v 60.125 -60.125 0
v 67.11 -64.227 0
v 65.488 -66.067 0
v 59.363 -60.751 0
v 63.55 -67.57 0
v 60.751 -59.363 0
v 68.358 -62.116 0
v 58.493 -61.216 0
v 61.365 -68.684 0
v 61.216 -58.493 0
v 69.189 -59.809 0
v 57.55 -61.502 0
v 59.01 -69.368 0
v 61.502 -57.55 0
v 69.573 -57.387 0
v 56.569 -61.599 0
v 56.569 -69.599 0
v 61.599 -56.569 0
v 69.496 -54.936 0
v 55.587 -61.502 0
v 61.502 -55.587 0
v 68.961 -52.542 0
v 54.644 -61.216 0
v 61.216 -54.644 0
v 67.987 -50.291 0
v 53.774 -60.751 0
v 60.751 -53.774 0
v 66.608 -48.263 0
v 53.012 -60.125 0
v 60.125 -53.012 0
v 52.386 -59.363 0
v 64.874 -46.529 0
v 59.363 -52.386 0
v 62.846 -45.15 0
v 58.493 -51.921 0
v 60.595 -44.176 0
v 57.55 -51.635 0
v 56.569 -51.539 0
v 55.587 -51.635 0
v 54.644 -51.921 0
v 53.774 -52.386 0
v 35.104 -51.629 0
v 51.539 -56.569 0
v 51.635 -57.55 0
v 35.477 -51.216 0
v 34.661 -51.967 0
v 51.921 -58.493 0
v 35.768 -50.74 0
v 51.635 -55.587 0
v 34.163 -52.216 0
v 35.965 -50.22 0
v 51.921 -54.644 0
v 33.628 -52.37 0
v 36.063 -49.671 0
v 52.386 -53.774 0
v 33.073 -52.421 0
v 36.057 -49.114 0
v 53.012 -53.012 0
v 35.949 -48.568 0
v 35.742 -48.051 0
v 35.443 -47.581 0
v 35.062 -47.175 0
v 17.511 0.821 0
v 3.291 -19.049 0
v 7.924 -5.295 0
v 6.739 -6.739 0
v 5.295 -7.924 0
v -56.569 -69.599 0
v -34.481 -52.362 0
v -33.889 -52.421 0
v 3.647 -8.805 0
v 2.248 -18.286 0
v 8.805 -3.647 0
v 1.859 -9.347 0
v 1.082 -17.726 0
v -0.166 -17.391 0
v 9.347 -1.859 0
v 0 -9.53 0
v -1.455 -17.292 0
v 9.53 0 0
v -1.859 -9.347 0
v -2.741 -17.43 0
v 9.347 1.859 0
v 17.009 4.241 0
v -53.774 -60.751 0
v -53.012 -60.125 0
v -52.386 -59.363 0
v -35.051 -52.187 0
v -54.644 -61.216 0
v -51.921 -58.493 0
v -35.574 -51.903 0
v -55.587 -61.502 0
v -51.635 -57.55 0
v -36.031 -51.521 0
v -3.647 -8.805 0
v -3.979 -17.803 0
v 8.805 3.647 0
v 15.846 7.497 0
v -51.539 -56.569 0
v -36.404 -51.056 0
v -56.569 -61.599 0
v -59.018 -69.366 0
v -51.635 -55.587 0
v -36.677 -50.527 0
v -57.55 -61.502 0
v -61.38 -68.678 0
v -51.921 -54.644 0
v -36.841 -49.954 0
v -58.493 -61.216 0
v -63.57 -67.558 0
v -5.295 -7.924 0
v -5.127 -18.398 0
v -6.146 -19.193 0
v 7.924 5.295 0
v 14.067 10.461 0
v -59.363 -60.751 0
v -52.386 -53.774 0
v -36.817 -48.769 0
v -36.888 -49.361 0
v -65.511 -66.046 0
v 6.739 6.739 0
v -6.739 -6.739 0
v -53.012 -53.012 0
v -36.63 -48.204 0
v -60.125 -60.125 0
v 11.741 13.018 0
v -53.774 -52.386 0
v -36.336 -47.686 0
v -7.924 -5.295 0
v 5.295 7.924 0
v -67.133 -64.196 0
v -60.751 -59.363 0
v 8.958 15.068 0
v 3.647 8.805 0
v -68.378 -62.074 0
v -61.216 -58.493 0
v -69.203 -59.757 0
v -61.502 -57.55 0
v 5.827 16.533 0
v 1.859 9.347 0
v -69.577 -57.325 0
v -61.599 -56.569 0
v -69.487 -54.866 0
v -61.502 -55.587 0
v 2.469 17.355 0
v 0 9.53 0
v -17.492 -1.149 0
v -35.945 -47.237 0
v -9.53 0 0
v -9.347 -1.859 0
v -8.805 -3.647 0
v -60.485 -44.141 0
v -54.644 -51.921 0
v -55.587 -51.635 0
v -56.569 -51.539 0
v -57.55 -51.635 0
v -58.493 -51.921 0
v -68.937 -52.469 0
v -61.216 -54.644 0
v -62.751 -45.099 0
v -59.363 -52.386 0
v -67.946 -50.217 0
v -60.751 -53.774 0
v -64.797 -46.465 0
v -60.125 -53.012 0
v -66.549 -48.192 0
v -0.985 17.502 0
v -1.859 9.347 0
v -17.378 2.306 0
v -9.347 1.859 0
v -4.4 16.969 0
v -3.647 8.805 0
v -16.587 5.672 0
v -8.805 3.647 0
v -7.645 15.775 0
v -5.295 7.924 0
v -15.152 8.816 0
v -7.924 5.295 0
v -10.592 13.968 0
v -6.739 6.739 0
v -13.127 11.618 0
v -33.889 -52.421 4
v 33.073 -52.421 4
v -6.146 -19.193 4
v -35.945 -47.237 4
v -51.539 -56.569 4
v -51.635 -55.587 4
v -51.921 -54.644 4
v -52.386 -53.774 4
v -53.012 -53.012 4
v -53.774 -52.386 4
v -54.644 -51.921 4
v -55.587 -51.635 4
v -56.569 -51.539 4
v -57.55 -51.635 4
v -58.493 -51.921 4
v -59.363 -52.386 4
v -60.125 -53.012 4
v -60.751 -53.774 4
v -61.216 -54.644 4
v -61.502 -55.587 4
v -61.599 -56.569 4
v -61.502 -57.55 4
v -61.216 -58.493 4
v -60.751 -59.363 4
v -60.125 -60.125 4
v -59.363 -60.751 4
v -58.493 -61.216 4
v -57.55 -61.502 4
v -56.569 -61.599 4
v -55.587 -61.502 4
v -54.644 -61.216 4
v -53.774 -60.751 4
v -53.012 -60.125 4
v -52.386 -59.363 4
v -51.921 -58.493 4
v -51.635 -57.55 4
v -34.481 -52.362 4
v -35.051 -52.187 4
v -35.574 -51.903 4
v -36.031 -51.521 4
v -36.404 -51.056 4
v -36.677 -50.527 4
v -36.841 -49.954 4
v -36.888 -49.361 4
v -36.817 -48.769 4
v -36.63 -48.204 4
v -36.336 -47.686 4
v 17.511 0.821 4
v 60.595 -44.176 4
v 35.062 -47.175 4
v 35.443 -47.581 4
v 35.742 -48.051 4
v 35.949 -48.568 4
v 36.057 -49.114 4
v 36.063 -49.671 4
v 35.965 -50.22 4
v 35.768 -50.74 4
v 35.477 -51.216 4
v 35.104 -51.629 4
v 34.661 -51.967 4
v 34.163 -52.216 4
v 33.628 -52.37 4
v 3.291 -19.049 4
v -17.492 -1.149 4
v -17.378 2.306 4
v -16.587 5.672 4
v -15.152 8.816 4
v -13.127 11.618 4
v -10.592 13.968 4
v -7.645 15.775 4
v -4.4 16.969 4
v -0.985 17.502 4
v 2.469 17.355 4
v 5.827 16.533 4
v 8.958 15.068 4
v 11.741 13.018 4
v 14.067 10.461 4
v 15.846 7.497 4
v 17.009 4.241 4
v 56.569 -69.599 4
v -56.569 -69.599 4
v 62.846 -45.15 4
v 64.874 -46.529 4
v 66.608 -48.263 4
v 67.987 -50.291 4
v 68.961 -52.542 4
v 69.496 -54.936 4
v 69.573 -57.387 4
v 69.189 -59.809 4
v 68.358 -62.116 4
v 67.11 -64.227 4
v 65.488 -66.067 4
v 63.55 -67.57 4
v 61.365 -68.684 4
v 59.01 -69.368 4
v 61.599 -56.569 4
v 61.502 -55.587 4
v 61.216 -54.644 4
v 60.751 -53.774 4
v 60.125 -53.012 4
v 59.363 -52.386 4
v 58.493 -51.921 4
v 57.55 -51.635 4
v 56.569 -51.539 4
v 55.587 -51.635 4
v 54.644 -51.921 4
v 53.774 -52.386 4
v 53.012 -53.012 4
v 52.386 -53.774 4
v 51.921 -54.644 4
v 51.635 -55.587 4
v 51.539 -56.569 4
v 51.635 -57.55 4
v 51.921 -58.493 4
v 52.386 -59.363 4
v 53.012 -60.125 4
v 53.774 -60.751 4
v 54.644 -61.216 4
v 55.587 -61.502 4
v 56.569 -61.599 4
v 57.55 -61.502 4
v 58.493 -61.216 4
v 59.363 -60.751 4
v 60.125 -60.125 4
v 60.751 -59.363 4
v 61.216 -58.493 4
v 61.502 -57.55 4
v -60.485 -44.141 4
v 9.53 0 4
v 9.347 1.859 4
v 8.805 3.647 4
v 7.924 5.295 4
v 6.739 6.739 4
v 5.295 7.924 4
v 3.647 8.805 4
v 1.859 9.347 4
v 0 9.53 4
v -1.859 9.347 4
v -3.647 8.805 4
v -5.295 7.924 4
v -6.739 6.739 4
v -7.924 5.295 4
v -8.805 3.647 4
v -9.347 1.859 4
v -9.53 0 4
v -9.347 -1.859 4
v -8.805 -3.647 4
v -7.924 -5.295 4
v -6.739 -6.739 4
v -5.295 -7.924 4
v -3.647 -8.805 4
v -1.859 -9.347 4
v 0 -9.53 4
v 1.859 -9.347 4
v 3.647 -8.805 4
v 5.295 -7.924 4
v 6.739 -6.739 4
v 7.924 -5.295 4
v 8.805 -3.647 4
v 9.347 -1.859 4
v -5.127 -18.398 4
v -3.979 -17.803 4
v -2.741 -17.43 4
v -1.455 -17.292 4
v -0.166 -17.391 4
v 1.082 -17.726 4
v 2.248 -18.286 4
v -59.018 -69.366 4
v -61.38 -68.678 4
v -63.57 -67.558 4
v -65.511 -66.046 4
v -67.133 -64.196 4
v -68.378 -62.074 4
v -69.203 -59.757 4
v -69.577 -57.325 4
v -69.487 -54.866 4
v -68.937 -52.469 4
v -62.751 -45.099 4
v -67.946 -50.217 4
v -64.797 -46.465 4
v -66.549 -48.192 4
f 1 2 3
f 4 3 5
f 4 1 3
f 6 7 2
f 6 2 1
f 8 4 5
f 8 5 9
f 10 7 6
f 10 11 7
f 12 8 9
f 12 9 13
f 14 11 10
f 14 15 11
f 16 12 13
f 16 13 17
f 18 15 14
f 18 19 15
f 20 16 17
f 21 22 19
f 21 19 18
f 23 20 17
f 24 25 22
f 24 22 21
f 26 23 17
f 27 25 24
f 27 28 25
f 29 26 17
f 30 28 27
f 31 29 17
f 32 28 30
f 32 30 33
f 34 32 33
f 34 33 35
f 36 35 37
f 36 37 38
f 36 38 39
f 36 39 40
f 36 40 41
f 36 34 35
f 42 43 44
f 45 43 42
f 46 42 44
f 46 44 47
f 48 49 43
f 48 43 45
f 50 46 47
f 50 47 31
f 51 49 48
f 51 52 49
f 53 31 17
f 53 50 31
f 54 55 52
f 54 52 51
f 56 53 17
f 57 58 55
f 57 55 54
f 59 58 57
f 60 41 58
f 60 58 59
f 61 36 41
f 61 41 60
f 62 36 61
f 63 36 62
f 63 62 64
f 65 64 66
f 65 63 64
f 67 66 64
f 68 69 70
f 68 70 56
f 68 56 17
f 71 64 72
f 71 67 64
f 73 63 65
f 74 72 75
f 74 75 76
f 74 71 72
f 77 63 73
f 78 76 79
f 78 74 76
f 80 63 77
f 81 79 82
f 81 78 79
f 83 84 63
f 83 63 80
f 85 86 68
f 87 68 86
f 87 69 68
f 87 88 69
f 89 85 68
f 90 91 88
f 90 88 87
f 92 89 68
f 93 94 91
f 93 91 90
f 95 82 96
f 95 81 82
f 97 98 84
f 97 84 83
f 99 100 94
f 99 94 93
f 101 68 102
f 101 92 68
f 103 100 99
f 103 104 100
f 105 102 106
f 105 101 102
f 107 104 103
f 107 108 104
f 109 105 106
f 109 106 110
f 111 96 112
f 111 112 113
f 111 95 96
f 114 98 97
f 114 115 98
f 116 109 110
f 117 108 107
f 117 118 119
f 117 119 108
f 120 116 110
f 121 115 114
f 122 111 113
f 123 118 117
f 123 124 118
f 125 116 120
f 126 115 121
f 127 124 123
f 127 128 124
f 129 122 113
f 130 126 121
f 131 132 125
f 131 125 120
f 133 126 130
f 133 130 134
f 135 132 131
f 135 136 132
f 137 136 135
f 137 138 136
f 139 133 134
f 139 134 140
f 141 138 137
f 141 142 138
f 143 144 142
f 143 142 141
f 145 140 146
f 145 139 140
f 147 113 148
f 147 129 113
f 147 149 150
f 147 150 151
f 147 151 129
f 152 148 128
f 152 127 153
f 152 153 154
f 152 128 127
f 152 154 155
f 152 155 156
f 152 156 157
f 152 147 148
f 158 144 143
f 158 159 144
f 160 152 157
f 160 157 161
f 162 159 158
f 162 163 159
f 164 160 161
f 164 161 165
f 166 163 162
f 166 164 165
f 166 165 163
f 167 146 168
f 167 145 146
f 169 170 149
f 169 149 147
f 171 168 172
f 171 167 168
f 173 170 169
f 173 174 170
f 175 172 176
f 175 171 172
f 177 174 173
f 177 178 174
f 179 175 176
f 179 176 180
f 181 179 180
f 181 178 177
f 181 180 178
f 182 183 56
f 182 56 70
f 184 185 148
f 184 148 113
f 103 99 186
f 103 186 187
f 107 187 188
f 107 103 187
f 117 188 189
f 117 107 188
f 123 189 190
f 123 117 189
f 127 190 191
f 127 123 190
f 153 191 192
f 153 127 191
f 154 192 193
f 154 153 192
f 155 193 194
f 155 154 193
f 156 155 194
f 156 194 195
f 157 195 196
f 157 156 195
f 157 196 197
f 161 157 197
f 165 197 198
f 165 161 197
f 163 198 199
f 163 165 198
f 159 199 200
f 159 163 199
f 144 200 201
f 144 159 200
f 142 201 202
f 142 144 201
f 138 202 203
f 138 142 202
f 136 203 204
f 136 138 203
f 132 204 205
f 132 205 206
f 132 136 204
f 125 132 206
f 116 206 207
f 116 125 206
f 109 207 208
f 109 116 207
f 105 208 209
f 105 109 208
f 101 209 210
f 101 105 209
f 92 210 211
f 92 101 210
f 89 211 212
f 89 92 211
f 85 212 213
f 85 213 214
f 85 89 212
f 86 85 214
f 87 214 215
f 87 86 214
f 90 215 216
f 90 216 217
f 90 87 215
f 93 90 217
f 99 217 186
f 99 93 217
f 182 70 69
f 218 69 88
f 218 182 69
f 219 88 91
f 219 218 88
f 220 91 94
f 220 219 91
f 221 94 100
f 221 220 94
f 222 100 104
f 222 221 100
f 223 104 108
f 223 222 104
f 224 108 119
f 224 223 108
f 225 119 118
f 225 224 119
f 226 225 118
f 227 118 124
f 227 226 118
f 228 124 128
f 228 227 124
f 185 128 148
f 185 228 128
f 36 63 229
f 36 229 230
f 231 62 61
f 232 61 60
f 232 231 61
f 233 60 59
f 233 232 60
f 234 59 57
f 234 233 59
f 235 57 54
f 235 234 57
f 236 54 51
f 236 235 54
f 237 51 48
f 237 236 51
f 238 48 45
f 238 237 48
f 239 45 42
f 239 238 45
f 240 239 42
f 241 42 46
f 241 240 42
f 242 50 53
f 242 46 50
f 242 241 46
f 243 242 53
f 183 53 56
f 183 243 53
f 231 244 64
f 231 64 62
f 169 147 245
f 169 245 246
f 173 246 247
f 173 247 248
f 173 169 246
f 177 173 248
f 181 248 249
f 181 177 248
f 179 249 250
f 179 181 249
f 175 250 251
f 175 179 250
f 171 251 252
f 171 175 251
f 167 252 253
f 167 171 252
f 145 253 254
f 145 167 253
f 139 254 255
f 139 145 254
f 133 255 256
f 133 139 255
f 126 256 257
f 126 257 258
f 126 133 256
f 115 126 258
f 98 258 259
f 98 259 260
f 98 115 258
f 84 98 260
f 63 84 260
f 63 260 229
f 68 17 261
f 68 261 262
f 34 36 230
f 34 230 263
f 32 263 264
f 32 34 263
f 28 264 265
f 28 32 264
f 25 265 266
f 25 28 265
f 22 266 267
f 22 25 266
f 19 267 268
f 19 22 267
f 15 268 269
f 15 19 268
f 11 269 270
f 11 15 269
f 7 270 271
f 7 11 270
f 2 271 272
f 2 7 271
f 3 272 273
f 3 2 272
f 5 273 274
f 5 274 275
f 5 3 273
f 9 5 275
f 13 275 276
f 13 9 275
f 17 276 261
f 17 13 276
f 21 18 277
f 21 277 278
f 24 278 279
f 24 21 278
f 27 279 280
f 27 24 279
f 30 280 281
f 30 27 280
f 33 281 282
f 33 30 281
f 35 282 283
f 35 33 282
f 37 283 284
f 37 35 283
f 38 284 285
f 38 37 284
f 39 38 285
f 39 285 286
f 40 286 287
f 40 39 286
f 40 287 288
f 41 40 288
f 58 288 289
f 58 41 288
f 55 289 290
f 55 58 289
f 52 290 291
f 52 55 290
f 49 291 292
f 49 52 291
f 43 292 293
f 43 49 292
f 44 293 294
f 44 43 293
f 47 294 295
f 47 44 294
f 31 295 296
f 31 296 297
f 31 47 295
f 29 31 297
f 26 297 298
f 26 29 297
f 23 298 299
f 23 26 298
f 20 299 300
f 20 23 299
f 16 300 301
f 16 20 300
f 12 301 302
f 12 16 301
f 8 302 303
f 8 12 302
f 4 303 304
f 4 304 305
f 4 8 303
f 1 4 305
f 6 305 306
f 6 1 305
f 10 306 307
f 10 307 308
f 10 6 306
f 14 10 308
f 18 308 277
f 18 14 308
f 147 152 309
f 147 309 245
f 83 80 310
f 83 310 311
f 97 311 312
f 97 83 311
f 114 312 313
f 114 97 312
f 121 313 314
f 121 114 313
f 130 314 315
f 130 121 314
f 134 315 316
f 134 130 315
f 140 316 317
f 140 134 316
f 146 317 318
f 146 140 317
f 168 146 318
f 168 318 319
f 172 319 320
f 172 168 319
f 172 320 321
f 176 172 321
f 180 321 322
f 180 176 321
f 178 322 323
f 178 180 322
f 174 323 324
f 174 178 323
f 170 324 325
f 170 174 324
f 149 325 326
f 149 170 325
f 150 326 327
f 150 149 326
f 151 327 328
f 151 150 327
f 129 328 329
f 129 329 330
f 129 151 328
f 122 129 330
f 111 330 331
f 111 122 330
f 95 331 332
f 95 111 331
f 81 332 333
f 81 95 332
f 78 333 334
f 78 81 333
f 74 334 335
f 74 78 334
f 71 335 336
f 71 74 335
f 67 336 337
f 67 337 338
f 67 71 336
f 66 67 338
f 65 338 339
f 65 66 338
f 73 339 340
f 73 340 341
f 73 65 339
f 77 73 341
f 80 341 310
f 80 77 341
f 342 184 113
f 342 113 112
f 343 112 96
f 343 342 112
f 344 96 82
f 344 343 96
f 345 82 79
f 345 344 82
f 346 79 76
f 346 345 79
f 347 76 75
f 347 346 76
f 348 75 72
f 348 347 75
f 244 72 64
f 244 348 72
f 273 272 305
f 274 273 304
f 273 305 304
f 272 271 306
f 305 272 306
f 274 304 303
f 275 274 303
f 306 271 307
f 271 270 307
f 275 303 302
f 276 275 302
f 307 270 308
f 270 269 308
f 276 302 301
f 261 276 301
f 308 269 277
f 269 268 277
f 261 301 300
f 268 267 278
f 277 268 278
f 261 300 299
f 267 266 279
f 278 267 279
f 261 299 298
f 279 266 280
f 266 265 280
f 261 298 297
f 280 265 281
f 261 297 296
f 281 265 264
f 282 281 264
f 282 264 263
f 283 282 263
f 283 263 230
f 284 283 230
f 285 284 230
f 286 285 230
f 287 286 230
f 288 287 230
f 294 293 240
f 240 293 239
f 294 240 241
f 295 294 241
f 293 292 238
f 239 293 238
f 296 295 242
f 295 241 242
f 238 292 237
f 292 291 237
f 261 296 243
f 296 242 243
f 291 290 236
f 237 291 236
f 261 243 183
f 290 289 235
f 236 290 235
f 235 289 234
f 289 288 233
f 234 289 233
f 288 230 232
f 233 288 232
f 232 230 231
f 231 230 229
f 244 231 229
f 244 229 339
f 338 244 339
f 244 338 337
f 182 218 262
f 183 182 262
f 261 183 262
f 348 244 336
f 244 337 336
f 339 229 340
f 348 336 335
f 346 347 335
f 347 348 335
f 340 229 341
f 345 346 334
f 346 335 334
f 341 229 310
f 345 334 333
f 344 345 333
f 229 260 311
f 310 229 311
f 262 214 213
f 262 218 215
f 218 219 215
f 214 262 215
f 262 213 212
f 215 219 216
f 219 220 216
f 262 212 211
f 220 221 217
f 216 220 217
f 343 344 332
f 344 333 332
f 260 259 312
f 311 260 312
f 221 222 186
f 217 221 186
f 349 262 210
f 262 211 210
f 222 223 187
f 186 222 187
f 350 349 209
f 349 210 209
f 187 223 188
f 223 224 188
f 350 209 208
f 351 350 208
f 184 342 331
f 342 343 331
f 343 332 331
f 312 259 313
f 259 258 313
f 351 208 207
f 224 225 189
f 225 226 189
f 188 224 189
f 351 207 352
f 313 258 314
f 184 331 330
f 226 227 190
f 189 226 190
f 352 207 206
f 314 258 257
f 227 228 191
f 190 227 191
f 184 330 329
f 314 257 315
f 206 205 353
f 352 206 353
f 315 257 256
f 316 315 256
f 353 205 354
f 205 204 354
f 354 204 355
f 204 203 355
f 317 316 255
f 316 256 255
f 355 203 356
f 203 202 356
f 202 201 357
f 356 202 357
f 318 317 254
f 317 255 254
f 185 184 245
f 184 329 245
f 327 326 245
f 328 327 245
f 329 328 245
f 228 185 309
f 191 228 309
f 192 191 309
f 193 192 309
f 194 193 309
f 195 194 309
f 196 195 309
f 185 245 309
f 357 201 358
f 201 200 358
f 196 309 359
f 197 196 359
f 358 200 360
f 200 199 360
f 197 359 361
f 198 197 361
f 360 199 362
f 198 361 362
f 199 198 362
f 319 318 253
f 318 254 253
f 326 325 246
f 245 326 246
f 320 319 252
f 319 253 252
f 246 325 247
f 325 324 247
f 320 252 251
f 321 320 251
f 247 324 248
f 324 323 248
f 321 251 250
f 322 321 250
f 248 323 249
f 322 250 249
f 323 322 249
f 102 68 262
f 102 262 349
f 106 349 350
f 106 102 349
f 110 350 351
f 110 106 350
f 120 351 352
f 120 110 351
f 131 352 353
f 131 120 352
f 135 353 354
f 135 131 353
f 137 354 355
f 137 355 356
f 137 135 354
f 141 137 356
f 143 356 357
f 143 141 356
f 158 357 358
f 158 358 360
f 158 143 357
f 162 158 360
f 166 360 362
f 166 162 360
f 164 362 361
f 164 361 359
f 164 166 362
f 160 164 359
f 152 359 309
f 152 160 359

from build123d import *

# Parameters (mm, degrees)
SKETCH_1_R          = 9.53
SKETCH_1_R_2        = 5.03
EXTRUDE_1_DEPTH     = 4
CUT_EXTRUDE_1_DEPTH = 10


with BuildPart() as part:
    # 草图1 → 凸台-拉伸1 (new body)
    with BuildSketch(Plane.XY):
        with BuildLine():
            Line((-60.484665535, -44.140957036), (-17.492328922, -1.148620423))
            ThreePointArc((-17.492328922, -1.148620423), (-0.984866816, 17.502312343), (17.510762826, 0.821026949))
            Line((17.510762826, 0.821026949), (60.595126742, -44.176306244))
            ThreePointArc((60.595126742, -44.176306244), (69.43811394, -58.606931767), (56.568542495, -69.598542495))
            Line((56.568542495, -69.598542495), (-56.568542495, -69.598542495))
            ThreePointArc((-56.568542495, -69.598542495), (-69.447058297, -58.549635813), (-60.484665535, -44.140957036))
        make_face()
        Circle(SKETCH_1_R, mode=Mode.SUBTRACT)
        with Locations((-56.568542495, -56.568542495)):
            Circle(SKETCH_1_R_2, mode=Mode.SUBTRACT)
        with Locations((56.568542495, -56.568542495)):
            Circle(SKETCH_1_R_2, mode=Mode.SUBTRACT)
    extrude(amount=EXTRUDE_1_DEPTH)

    # 草图2 → 切除-拉伸1 (cut)
    with BuildSketch(Plane.XY.offset(4)):
        with BuildLine():
            Line((-35.944637397, -47.236581954), (-6.146065042, -19.193110209))
            ThreePointArc((-6.146065042, -19.193110209), (-1.455267075, -17.291512681), (3.291241318, -19.049442373))
            Line((3.291241318, -19.049442373), (35.061663803, -47.175010024))
            ThreePointArc((35.061663803, -47.175010024), (35.878352511, -50.484569716), (33.073110812, -52.421264017))
            Line((33.073110812, -52.421264017), (-33.888630519, -52.421264017))
            ThreePointArc((-33.888630519, -52.421264017), (-36.677361968, -50.527146879), (-35.944637397, -47.236581954))
        make_face()
    extrude(amount=-CUT_EXTRUDE_1_DEPTH, mode=Mode.SUBTRACT)


solid = part.part
